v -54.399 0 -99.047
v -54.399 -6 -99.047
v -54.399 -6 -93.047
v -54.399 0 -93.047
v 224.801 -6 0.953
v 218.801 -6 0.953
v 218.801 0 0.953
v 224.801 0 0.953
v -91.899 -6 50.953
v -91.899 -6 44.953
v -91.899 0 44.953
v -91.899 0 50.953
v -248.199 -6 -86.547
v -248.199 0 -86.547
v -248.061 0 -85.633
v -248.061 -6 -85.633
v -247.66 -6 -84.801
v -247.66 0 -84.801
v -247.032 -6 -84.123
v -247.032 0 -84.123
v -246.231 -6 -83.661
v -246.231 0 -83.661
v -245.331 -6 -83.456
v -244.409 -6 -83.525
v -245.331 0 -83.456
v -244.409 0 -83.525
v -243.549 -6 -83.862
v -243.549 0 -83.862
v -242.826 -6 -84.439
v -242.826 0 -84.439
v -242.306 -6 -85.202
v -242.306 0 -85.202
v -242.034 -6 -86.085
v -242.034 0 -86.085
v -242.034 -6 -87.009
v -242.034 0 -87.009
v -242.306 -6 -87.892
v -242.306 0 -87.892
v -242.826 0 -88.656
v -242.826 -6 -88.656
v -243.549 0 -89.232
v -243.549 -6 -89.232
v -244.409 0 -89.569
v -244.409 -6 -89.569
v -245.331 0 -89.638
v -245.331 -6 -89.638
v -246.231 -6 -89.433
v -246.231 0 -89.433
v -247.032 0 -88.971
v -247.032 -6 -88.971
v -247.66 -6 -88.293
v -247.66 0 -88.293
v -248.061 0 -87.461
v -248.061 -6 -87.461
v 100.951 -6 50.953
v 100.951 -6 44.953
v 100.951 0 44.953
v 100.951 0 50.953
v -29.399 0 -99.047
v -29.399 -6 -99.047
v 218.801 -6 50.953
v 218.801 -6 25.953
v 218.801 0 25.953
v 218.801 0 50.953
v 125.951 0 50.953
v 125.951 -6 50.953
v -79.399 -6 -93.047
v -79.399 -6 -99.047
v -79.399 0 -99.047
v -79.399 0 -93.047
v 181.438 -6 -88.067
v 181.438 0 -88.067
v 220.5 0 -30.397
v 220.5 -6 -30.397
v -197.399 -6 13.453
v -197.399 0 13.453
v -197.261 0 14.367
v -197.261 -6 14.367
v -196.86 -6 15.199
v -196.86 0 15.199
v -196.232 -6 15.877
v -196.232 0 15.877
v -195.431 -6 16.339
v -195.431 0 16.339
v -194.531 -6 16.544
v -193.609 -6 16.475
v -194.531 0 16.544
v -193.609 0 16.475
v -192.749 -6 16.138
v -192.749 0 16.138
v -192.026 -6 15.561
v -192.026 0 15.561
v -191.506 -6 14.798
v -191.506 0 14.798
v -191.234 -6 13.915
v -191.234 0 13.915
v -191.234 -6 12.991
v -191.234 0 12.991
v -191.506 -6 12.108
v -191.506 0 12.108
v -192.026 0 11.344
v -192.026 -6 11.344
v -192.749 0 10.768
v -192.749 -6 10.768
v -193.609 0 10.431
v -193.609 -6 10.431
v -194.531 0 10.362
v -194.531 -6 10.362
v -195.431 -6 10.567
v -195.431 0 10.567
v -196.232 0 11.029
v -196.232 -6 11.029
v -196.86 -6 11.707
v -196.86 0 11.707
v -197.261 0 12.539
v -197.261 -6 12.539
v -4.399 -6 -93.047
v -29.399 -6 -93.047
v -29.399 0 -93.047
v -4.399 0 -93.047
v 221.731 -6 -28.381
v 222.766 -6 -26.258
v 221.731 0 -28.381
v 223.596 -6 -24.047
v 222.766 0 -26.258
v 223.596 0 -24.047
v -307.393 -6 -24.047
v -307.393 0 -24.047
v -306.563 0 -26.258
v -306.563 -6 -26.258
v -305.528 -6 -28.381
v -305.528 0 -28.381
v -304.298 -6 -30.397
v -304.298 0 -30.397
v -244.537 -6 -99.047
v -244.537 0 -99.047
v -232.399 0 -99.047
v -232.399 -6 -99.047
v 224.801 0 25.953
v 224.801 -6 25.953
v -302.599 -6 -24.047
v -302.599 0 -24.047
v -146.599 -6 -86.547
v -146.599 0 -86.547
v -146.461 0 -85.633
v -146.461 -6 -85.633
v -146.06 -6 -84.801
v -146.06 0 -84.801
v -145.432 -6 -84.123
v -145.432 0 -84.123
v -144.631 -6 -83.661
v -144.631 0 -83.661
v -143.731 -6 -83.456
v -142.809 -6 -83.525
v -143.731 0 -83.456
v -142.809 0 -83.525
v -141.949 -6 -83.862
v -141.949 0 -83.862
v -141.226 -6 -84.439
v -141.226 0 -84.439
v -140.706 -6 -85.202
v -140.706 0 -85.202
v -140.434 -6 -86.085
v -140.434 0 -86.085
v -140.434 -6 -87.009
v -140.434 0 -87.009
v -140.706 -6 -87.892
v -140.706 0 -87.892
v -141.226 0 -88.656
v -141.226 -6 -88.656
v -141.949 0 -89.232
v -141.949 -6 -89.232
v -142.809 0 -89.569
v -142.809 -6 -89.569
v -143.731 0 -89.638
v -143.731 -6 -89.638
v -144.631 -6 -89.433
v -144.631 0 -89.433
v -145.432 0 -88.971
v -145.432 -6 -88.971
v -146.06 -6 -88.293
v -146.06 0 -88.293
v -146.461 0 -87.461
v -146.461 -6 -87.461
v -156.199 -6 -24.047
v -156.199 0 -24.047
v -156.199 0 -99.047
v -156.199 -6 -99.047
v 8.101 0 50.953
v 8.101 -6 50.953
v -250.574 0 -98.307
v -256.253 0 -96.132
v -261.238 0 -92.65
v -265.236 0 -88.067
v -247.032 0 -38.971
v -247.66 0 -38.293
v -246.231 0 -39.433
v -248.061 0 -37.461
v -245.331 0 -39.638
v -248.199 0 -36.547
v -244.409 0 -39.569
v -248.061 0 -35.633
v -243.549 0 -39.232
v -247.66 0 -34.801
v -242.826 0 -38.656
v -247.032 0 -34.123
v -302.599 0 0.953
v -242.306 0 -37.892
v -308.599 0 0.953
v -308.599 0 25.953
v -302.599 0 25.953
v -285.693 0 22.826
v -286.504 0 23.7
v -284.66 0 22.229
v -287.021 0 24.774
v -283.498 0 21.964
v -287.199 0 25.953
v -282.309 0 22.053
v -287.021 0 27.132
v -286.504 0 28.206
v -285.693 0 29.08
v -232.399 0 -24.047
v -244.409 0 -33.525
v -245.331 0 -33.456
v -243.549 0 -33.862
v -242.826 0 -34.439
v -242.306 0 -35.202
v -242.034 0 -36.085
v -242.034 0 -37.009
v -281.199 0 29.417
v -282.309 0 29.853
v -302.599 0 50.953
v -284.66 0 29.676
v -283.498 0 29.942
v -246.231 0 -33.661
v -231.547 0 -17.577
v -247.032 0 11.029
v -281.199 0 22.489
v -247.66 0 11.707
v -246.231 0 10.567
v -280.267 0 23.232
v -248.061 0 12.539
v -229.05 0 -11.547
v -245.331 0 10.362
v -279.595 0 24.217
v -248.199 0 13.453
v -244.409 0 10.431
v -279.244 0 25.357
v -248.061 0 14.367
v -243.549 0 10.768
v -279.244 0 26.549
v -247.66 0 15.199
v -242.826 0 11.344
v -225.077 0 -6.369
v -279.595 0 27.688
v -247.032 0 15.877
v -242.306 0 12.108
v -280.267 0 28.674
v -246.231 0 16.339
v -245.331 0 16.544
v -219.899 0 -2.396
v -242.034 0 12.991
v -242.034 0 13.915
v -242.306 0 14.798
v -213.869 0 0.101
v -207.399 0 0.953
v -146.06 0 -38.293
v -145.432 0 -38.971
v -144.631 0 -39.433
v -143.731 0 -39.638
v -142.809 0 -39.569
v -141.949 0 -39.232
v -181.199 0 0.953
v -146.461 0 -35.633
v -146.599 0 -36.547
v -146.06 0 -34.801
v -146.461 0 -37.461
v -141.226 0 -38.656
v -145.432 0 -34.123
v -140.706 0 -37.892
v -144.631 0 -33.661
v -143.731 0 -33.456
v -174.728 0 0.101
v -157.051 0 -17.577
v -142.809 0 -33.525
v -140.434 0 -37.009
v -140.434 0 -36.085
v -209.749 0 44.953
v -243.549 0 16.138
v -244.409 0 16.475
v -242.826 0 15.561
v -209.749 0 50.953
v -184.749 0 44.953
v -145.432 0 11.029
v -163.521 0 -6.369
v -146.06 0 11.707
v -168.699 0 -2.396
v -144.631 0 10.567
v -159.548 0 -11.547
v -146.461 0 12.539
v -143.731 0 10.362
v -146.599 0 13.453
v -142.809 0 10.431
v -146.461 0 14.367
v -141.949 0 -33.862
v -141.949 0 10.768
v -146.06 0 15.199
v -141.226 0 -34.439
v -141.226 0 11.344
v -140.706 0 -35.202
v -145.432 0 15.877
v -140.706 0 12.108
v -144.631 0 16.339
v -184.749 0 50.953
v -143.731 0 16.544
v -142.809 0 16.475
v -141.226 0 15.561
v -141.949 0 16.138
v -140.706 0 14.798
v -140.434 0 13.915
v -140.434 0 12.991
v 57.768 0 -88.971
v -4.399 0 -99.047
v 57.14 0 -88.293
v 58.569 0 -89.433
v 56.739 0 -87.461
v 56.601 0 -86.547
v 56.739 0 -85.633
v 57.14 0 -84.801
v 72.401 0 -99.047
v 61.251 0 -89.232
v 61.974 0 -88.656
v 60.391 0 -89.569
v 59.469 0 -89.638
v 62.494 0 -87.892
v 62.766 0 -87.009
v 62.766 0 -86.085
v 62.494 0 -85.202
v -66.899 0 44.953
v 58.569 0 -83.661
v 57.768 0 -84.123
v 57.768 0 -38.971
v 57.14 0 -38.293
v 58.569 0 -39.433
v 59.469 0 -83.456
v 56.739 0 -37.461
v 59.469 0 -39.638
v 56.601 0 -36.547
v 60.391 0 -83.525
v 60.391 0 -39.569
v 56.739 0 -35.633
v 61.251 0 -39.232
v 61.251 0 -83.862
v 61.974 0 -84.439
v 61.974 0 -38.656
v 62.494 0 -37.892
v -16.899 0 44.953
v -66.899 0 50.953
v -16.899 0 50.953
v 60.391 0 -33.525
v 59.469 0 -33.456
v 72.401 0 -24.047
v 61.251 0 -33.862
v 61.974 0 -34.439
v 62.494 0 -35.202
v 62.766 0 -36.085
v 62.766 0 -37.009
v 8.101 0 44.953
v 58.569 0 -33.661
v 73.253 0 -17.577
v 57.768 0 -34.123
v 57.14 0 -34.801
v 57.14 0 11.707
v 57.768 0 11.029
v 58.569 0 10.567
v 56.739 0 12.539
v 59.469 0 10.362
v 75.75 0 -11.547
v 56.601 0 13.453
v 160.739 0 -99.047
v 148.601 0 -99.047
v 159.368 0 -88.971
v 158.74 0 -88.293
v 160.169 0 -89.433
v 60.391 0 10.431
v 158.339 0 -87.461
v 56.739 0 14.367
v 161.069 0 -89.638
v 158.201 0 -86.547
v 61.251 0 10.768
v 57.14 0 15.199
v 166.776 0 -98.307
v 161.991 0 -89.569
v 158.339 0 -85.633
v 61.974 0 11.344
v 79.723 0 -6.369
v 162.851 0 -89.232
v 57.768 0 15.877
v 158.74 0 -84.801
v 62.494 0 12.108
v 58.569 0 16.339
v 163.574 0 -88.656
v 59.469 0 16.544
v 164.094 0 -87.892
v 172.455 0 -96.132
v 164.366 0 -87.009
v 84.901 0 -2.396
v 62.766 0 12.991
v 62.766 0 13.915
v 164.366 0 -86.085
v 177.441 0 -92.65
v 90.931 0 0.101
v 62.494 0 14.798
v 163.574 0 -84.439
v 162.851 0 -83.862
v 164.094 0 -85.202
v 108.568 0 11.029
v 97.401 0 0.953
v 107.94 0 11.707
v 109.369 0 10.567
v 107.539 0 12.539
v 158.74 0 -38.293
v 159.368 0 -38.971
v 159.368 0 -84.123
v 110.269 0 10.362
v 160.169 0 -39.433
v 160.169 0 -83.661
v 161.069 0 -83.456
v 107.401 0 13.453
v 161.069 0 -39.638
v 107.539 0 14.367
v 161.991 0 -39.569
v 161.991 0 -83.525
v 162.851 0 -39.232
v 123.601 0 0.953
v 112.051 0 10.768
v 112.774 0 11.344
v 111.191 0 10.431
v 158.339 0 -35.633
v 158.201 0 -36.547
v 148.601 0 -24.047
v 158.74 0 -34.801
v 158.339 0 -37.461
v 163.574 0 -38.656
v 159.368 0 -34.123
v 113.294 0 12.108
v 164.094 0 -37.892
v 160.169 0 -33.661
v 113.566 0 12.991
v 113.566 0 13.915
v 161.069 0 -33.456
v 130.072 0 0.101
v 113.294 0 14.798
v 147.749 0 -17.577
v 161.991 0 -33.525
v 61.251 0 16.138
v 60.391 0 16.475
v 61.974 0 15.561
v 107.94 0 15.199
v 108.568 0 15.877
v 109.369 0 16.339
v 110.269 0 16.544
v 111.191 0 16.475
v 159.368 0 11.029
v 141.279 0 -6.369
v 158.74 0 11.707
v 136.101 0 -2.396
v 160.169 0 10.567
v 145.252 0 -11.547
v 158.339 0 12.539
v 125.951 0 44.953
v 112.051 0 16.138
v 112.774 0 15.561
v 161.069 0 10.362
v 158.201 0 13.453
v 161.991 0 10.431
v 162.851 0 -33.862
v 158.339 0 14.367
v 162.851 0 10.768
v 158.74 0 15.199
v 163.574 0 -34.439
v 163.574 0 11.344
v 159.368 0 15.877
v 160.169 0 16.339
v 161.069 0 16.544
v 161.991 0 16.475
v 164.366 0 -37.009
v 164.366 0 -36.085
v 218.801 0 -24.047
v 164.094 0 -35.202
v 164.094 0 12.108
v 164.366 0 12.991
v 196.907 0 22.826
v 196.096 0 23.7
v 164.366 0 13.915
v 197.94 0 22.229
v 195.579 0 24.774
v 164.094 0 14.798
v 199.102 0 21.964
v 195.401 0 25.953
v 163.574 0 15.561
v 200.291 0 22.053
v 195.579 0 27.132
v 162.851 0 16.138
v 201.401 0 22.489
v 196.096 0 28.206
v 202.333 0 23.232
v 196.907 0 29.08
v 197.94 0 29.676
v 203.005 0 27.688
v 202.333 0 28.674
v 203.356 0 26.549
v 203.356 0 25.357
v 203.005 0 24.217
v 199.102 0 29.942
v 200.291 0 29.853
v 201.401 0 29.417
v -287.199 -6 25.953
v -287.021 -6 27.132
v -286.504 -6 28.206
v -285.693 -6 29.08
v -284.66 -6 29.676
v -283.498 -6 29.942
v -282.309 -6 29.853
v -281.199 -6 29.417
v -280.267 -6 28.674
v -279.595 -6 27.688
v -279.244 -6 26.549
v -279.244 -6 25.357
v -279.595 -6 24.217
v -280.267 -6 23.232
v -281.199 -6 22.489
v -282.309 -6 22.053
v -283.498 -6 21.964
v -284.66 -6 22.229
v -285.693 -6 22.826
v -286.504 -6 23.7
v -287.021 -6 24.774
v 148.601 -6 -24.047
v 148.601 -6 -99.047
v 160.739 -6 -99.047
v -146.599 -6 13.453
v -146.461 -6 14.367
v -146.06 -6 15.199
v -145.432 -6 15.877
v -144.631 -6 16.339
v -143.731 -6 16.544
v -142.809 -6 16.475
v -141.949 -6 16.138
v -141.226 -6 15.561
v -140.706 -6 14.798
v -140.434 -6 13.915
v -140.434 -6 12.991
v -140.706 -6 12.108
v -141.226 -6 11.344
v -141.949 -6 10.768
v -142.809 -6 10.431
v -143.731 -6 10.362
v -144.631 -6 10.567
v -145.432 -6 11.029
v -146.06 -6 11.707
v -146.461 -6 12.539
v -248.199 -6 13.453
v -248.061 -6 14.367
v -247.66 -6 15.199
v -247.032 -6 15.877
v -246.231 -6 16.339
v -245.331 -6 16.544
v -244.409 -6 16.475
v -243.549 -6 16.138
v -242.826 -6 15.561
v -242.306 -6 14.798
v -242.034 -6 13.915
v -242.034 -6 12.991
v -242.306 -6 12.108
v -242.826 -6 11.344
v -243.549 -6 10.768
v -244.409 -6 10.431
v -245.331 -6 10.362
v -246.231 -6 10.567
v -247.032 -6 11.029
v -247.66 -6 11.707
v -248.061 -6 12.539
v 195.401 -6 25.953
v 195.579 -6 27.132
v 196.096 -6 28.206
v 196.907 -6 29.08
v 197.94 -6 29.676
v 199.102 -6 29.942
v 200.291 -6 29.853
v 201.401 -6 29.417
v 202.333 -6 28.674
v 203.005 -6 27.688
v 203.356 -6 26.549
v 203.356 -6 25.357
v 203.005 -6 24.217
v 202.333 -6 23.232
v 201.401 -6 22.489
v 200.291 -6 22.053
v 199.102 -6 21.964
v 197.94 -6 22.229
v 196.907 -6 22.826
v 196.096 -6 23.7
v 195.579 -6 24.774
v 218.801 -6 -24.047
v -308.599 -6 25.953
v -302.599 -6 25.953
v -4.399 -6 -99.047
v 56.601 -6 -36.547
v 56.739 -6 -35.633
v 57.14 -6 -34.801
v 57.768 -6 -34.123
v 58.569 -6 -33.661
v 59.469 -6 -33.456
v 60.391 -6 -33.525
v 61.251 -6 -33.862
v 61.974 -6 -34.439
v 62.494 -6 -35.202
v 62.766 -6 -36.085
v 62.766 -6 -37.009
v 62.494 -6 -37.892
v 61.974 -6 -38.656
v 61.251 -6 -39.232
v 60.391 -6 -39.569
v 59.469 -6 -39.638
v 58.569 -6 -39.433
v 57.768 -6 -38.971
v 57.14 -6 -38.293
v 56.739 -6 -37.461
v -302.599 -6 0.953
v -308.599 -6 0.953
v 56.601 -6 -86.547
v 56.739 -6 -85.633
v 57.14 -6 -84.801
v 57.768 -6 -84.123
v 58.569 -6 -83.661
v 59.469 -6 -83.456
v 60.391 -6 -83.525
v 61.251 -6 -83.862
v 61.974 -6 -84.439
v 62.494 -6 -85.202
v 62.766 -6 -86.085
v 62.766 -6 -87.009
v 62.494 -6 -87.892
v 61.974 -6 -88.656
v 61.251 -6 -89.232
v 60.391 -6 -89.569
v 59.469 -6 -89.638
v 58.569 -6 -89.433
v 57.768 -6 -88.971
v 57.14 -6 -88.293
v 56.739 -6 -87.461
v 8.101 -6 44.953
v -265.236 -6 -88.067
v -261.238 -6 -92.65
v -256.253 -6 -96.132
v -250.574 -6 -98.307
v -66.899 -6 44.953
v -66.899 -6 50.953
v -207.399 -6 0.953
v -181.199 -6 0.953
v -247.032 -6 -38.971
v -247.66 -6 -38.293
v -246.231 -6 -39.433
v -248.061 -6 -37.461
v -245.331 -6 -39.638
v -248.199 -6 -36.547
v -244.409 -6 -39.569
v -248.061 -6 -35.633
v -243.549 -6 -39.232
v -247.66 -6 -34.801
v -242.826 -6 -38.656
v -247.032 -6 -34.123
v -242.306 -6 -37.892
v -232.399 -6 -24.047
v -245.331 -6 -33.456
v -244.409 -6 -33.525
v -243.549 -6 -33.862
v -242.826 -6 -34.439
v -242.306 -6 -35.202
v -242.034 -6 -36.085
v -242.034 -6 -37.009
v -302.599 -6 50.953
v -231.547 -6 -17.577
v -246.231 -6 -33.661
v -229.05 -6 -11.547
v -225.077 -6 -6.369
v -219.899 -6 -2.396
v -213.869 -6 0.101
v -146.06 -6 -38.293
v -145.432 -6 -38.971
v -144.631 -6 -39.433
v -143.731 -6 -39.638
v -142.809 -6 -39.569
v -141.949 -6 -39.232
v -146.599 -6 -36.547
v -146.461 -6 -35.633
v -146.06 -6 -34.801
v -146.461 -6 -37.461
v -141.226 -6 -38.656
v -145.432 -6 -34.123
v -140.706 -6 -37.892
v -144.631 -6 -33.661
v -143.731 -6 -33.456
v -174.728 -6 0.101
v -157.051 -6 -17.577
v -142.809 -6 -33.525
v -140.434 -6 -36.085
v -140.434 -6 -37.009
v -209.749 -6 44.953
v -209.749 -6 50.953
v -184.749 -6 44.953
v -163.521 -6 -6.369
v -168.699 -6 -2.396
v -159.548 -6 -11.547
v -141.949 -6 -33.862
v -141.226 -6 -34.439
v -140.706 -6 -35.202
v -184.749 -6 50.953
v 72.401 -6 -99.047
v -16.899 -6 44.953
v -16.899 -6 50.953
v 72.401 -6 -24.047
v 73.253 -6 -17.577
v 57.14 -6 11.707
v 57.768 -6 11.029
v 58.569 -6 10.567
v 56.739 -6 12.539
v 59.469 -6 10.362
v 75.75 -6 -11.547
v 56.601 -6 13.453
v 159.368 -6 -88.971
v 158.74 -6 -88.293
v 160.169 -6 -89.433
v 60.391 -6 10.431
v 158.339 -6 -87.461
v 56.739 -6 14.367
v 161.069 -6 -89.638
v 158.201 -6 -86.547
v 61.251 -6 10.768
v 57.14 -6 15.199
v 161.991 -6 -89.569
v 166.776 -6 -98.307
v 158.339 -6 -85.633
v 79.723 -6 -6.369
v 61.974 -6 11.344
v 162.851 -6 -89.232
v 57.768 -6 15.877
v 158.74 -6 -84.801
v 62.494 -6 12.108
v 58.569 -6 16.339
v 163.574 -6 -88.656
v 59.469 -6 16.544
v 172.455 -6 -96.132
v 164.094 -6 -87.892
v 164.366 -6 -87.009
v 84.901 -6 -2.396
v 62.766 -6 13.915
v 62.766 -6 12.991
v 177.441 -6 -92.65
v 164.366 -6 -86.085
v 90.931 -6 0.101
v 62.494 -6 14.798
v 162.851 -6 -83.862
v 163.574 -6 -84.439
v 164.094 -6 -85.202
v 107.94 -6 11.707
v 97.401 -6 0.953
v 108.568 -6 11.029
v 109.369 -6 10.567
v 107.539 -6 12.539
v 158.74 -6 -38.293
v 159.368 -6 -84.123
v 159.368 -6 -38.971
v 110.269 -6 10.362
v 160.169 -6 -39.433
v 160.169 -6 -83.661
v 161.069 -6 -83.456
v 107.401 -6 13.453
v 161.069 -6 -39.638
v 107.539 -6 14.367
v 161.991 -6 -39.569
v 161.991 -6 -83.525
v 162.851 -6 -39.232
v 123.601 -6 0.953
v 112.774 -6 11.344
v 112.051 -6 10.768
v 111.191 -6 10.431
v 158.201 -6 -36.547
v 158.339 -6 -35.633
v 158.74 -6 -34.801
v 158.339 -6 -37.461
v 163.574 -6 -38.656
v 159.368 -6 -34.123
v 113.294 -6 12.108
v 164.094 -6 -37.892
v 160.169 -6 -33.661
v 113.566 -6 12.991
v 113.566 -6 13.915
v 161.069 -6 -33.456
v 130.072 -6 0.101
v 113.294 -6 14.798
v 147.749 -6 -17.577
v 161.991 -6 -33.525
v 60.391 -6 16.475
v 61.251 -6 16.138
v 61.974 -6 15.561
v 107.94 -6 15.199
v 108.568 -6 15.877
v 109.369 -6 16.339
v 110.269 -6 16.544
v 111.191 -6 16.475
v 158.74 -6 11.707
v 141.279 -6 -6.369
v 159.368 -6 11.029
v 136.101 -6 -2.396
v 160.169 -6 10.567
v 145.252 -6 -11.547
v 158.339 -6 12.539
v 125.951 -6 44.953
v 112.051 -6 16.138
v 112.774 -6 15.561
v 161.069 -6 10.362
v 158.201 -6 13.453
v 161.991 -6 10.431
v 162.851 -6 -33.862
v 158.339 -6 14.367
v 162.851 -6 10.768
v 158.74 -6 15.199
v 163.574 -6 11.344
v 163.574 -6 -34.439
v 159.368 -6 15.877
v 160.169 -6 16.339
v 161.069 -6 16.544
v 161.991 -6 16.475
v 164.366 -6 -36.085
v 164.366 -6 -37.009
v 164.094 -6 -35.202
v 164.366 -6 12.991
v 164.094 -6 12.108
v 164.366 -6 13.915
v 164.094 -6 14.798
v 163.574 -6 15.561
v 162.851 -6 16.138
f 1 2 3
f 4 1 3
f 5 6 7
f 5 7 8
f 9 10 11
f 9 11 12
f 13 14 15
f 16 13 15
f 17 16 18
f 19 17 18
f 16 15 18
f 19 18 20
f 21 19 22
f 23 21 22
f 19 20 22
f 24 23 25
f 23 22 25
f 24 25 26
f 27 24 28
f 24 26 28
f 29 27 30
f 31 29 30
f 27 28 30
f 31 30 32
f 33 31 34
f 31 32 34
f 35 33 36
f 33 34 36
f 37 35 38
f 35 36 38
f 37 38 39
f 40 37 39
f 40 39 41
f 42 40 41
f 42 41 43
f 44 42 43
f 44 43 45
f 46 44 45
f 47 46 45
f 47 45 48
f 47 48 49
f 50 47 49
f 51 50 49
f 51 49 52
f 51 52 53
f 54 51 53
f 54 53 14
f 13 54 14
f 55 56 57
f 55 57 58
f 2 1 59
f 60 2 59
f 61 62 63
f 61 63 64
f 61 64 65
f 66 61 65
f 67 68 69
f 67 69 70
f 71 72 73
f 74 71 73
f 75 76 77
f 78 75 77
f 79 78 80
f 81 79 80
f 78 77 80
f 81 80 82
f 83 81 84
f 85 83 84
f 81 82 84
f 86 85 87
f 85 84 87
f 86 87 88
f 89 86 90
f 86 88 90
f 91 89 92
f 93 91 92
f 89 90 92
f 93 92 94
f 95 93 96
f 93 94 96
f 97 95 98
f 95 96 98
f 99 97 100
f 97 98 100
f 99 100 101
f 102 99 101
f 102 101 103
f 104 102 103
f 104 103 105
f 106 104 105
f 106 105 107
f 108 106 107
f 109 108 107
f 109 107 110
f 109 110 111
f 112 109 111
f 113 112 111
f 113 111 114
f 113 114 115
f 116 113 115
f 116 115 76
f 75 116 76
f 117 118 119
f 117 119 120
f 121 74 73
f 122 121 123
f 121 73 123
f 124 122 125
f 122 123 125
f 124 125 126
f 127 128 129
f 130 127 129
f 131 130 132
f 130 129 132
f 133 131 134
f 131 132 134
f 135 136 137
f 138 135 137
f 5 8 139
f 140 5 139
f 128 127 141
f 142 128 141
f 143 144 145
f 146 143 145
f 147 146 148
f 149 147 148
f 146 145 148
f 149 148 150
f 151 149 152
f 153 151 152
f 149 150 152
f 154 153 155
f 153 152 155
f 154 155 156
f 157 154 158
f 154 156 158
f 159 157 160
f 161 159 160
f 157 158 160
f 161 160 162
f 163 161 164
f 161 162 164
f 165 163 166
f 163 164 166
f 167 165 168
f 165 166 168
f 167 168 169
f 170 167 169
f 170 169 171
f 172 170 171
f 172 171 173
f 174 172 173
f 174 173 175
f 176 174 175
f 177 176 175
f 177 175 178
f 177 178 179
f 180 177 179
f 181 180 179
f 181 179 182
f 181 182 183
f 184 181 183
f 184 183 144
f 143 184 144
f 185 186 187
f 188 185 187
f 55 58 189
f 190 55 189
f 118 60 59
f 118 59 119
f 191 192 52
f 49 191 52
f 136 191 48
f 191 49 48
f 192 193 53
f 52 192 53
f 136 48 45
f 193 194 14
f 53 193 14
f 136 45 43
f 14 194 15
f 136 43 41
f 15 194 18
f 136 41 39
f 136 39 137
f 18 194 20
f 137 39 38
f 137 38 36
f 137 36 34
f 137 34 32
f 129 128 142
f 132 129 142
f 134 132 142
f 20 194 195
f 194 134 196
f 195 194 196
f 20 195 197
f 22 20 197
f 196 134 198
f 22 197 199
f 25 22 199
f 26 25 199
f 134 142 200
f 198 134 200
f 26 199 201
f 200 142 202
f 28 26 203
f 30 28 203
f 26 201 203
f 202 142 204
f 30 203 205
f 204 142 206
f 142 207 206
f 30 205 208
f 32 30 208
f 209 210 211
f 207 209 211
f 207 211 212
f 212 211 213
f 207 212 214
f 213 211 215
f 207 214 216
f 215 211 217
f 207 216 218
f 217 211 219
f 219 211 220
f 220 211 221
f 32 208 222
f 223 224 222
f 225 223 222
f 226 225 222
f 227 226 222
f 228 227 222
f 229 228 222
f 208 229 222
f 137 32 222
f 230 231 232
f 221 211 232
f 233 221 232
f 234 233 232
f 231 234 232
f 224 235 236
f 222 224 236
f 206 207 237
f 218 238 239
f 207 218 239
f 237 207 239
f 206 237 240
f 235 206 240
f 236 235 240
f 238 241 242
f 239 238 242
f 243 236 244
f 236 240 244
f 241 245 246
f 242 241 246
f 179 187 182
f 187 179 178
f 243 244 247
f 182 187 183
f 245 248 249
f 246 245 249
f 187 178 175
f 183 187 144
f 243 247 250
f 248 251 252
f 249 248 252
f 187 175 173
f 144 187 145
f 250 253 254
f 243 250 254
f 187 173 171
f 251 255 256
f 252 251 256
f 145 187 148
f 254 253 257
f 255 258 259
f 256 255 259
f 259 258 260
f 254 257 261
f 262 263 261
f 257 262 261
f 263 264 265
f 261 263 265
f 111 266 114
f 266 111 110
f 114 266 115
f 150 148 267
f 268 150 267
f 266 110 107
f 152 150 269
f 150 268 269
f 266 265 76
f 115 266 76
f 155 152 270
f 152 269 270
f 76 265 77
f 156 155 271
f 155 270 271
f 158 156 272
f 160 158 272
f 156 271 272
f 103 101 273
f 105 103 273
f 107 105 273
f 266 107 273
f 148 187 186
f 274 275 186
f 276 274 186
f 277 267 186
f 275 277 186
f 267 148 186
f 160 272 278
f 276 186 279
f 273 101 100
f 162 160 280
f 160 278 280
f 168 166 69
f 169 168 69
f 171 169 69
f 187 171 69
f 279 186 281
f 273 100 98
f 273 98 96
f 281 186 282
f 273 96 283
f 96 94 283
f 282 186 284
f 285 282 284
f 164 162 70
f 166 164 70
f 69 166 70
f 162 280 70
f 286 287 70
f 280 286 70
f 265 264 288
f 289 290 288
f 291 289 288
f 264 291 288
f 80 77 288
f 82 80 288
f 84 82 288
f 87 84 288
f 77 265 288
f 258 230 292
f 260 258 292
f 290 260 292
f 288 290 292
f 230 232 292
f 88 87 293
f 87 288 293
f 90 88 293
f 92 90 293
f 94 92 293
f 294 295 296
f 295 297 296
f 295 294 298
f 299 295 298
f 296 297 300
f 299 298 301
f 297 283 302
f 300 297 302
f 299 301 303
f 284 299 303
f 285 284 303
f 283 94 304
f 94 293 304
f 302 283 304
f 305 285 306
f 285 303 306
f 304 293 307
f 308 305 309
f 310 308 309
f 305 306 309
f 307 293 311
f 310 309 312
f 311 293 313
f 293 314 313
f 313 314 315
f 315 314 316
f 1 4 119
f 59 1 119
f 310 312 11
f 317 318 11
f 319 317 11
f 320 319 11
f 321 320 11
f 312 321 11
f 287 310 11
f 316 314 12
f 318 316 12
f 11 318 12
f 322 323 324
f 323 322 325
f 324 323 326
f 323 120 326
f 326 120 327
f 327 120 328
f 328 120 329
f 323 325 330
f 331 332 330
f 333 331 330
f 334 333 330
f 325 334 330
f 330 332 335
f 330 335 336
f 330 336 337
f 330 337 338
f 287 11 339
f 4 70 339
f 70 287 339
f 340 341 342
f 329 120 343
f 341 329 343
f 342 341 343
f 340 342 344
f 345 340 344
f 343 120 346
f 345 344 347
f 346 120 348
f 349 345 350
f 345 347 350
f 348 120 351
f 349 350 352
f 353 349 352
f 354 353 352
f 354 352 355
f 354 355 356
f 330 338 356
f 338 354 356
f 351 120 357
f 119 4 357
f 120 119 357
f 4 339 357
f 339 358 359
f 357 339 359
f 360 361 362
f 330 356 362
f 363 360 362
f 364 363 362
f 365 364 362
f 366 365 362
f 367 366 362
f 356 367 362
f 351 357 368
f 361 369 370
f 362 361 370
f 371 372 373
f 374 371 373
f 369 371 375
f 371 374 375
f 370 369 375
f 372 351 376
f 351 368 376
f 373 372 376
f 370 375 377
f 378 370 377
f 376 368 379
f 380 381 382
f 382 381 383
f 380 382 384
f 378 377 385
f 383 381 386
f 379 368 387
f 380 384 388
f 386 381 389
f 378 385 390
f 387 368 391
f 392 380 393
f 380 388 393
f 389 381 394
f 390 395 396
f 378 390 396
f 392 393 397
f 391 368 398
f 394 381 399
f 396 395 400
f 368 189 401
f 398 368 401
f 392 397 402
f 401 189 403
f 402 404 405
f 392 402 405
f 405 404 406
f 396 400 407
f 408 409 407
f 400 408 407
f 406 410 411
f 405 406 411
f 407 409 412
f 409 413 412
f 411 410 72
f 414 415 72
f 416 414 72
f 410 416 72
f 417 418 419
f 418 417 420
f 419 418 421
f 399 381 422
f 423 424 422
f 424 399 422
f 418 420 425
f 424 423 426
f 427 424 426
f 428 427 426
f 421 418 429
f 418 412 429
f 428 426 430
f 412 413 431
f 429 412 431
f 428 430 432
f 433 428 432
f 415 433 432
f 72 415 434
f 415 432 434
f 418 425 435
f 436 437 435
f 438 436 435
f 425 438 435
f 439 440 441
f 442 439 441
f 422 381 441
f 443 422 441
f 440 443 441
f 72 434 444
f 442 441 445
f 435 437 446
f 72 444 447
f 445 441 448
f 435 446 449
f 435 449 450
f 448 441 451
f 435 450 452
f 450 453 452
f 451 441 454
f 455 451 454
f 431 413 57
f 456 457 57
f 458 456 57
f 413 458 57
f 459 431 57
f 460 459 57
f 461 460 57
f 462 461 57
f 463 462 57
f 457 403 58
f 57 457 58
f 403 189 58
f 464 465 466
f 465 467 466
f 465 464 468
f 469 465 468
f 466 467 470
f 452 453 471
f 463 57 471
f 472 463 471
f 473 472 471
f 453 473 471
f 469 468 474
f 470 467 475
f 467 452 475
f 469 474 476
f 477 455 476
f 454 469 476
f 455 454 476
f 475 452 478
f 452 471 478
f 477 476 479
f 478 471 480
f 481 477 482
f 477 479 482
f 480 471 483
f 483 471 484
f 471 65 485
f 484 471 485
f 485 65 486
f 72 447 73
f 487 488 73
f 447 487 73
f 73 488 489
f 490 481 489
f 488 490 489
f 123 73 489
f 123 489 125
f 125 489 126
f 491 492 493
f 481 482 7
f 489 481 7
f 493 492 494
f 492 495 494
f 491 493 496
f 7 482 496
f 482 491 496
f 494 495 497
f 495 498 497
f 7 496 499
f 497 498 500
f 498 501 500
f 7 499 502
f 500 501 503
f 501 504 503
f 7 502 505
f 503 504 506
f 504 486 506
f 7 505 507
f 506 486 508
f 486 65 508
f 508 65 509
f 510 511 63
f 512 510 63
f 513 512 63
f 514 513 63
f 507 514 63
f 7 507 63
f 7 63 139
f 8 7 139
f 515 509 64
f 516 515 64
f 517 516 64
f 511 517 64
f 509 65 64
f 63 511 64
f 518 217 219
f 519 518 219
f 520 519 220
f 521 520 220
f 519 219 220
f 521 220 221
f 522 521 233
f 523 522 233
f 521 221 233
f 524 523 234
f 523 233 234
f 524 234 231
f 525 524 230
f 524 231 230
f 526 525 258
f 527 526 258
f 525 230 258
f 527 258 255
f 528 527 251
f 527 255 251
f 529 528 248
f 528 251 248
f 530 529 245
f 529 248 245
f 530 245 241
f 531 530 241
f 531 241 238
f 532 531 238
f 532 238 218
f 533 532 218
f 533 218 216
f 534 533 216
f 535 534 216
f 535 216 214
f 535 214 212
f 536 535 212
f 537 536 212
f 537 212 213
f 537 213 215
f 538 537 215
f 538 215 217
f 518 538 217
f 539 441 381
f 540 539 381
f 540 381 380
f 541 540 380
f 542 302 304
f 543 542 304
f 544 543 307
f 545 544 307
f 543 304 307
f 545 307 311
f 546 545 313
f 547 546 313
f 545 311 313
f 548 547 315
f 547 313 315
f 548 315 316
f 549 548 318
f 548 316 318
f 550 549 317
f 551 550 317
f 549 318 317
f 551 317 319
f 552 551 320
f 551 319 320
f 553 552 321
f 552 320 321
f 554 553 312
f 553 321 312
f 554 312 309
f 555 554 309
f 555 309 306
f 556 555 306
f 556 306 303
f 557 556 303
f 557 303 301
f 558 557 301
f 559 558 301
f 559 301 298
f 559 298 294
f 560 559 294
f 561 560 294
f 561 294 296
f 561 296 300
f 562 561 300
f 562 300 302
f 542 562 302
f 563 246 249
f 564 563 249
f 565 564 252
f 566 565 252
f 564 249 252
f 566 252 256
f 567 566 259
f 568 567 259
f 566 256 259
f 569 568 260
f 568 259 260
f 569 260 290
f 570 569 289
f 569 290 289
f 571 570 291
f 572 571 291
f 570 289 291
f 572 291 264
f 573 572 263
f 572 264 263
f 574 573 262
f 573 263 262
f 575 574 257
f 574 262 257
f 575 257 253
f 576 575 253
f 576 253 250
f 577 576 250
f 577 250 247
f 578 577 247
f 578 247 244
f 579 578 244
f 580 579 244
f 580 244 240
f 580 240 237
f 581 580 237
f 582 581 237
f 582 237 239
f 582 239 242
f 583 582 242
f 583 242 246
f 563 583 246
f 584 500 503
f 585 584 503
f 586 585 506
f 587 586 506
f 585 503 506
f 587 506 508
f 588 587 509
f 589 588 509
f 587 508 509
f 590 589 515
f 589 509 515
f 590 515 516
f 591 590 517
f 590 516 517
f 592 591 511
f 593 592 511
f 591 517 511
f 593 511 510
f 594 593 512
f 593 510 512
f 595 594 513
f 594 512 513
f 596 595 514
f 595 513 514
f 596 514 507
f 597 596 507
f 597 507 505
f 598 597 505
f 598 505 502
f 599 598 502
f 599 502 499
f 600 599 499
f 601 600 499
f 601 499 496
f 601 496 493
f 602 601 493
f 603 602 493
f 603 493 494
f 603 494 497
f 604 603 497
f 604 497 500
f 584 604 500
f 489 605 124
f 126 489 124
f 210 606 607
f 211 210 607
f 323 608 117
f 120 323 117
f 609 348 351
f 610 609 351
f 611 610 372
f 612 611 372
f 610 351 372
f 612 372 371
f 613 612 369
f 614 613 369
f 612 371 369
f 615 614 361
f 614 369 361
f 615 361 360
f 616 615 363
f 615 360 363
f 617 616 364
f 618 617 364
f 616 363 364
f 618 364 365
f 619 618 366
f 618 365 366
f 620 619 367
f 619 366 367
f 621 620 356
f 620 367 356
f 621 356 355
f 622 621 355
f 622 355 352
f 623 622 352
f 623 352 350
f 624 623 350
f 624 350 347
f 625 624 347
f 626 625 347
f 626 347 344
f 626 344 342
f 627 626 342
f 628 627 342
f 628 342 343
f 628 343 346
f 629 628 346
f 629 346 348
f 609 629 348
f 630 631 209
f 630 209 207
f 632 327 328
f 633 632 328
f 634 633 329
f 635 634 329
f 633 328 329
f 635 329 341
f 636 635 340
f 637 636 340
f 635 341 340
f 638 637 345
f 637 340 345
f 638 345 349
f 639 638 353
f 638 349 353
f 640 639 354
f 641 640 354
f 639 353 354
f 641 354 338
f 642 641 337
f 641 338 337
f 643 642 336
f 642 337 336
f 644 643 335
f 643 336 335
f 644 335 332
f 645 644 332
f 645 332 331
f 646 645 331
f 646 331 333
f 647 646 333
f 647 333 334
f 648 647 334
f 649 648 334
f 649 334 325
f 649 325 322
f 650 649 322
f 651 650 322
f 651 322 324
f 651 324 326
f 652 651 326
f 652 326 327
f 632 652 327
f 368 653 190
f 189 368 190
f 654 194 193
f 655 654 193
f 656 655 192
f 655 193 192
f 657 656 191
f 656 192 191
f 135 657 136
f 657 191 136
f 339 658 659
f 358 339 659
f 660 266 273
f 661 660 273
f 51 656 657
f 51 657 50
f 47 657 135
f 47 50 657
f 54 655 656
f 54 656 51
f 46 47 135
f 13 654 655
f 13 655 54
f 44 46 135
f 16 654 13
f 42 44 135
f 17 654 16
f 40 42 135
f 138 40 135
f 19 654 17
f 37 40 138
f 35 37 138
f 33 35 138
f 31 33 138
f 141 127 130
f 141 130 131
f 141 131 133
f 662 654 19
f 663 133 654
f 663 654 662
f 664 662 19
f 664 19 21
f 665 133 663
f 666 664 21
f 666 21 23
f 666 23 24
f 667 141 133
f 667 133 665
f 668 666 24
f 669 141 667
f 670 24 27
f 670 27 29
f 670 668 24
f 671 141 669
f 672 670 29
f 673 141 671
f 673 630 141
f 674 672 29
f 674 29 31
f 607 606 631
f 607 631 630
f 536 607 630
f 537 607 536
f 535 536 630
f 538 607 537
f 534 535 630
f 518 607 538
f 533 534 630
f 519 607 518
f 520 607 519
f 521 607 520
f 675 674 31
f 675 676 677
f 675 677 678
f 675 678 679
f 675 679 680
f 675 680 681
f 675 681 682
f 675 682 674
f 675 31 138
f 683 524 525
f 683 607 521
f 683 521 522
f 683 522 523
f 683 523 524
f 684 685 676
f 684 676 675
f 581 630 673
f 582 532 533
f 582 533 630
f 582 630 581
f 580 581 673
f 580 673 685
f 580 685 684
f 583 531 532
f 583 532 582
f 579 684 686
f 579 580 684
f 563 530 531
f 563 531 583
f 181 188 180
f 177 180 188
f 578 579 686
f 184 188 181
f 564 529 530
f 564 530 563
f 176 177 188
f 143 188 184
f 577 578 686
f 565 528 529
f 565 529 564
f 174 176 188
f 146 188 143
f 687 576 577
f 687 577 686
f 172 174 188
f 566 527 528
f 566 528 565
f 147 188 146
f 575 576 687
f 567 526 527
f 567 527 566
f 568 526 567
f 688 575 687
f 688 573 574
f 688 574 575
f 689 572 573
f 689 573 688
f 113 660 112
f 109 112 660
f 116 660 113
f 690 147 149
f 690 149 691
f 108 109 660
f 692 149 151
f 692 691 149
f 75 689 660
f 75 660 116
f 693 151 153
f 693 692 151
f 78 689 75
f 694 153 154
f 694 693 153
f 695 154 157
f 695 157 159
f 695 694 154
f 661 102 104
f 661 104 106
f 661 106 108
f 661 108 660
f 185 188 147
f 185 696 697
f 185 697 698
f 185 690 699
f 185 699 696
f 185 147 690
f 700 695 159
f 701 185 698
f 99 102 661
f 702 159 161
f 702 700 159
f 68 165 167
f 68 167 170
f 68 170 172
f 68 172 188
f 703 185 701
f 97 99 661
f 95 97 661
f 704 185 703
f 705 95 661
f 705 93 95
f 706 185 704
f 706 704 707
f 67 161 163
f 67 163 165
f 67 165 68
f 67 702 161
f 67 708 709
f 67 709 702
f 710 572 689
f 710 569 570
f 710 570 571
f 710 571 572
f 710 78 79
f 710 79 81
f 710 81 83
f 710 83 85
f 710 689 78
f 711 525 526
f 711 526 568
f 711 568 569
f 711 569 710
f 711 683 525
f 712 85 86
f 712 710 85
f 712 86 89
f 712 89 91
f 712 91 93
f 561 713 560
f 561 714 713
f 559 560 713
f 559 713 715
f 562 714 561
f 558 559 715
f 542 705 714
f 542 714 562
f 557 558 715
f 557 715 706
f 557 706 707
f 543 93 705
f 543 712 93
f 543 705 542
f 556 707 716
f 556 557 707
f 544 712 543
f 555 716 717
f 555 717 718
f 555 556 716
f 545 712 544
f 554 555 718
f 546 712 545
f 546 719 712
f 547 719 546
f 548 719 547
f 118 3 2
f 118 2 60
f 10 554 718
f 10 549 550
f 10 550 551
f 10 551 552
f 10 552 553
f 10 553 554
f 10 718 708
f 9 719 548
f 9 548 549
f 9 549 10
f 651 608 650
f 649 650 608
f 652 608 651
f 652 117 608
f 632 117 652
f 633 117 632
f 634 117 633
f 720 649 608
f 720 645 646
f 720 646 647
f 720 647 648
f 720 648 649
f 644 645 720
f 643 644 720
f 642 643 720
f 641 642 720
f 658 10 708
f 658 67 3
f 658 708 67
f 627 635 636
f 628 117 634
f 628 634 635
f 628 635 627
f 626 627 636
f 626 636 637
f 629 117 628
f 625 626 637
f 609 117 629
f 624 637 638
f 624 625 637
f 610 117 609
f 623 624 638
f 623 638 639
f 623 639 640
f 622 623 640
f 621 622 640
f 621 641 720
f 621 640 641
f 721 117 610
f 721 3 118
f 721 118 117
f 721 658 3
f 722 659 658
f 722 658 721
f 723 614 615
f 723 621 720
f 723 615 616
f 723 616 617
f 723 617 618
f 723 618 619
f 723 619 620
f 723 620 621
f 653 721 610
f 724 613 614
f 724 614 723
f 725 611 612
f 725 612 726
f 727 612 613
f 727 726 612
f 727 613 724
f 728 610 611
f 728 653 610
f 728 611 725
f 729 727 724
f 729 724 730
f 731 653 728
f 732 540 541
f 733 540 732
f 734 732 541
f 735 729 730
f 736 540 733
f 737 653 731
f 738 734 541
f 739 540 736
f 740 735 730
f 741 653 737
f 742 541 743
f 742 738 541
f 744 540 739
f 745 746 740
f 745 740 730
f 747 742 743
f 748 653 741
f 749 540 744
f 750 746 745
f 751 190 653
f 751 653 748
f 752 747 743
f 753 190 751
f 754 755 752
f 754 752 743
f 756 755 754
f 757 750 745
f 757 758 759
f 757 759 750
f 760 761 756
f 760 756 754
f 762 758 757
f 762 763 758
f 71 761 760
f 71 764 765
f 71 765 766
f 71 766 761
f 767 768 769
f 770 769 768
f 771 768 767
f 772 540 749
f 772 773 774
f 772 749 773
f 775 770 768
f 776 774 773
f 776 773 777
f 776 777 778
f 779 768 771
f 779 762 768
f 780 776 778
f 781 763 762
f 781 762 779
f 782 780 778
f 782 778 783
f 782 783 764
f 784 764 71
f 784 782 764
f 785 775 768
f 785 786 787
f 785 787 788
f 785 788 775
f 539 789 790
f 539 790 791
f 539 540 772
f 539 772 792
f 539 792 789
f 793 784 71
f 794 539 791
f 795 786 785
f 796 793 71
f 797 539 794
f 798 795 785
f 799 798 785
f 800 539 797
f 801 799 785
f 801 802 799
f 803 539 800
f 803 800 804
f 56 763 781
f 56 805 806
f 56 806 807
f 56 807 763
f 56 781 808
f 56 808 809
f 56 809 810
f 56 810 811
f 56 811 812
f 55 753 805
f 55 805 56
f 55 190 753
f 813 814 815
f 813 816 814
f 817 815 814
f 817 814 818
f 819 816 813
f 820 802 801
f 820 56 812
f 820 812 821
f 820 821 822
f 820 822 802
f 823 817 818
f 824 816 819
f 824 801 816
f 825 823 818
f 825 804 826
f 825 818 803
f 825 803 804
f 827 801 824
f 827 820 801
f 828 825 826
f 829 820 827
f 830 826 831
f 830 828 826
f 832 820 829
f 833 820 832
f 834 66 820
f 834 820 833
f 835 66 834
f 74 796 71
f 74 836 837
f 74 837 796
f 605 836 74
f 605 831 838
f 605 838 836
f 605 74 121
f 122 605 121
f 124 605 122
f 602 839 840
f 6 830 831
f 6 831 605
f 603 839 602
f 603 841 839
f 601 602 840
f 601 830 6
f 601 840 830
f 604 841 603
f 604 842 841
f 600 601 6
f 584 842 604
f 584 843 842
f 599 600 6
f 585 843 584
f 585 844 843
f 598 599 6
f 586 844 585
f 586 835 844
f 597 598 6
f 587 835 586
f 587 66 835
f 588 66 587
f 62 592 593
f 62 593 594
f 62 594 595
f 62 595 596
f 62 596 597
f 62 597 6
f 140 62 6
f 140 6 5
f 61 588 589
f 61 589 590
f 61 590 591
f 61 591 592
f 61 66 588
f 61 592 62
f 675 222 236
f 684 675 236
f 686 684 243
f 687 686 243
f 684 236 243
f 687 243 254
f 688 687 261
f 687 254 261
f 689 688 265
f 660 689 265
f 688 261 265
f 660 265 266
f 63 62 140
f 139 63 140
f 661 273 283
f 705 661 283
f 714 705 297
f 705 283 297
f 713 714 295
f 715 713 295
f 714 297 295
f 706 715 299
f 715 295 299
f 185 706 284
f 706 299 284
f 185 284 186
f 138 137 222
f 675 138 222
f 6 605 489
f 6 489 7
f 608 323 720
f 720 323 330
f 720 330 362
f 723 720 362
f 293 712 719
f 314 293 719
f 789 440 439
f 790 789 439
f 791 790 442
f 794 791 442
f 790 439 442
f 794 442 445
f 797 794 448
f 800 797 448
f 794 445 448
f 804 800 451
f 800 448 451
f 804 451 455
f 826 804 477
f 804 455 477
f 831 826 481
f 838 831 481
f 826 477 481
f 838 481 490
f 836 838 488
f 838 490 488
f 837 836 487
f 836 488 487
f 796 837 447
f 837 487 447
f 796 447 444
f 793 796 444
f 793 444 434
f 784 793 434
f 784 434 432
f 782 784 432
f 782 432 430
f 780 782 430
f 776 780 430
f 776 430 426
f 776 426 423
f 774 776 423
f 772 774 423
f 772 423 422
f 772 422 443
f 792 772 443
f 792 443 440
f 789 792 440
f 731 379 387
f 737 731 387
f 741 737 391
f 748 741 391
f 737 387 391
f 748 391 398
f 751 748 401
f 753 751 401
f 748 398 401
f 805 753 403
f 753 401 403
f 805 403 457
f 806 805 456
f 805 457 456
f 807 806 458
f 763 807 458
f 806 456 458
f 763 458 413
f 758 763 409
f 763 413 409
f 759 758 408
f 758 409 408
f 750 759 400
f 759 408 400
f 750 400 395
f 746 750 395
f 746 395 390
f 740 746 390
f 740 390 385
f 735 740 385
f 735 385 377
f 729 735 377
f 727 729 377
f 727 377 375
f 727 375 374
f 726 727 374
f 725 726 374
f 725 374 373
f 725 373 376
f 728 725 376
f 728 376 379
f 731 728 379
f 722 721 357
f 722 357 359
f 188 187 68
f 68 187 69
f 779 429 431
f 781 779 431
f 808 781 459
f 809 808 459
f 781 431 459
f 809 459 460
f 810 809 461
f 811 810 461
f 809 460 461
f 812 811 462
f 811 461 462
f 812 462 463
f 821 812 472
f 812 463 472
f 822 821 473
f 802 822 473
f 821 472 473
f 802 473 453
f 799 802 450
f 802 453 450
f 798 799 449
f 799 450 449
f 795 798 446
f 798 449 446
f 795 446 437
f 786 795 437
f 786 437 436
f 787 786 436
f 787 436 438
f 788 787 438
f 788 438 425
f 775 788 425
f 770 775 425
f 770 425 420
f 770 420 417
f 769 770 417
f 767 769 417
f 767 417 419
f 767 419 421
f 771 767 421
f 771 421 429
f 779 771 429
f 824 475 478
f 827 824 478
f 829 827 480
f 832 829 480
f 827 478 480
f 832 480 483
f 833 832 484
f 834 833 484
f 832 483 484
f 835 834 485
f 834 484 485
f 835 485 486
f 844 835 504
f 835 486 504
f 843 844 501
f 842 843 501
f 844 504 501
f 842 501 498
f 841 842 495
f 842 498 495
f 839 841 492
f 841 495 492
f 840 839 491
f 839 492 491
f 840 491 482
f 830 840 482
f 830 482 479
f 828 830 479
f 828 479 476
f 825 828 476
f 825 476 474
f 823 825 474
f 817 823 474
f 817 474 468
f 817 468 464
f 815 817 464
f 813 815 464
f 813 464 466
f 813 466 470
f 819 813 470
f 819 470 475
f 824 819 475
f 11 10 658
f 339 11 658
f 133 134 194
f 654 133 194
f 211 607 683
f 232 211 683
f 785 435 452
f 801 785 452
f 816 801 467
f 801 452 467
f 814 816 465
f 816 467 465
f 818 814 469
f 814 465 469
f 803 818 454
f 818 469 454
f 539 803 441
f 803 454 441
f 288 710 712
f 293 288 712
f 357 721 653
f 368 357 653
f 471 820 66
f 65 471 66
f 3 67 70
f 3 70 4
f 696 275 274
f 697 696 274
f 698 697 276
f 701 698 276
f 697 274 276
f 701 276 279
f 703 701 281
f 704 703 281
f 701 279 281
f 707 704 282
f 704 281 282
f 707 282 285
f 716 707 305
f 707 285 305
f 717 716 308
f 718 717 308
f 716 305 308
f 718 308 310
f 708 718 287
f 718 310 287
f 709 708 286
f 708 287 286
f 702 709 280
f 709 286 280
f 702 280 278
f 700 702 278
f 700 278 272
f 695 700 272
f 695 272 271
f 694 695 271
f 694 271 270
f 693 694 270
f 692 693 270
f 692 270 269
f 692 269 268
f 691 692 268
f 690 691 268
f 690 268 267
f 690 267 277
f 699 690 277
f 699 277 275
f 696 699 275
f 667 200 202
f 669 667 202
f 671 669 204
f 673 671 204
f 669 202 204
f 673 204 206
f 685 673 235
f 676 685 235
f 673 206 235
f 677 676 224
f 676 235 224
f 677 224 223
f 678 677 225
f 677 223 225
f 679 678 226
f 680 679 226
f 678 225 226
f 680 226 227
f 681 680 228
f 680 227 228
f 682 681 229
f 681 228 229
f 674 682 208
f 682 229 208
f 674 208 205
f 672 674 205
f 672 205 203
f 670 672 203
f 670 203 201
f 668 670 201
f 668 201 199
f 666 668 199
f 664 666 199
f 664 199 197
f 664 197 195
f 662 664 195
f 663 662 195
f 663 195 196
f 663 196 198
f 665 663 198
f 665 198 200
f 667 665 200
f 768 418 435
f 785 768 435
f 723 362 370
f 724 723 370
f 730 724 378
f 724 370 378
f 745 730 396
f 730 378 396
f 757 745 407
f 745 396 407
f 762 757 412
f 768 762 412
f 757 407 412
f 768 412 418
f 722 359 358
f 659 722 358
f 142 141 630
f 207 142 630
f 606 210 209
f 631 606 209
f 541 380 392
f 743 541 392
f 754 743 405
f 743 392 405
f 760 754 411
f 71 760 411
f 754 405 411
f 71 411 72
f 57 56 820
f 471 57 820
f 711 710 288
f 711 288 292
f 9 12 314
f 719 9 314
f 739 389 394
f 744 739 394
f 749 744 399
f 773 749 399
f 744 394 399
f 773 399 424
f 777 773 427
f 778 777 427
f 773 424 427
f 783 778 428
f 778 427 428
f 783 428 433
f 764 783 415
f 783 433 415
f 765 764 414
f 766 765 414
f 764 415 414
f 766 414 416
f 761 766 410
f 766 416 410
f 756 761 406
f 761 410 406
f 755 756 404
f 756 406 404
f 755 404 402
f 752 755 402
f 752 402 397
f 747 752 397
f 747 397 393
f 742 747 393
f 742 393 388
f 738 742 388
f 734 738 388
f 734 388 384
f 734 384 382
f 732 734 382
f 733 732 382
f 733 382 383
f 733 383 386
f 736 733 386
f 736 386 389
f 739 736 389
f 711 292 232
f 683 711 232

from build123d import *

# Parameters (mm, degrees)
F1_DEPTH = 6
F2_W     = 6
F2_H     = 25
F2_W_2   = 25
F2_H_2   = 6
F3_DEPTH = 25
F5_D     = 6.2
F6_D     = 8


with BuildPart() as f1:
    # F0 (on Front) → F1 (new body)
    with BuildSketch(Plane.XZ):
        with BuildLine():
            Line((224.8010802506, 50.9528913677), (-308.5989197494, 50.9528913677))
            Line((-308.5989197494, 50.9528913677), (-308.5989197494, -16.3773312117))
            ThreePointArc((-308.5989197494, -16.3773312117), (-307.4994411864, -23.709798398), (-304.2977137462, -30.3973143456))
            Line((-304.2977137462, -30.3973143456), (-265.2360511733, -88.0670917662))
            ThreePointArc((-265.2360511733, -88.0670917662), (-256.2526406882, -96.1321666846), (-244.5372571765, -99.0471086323))
            Line((-244.5372571765, -99.0471086323), (-232.3989197494, -99.0471086323))
            Line((-232.3989197494, -99.0471086323), (-232.3989197494, -24.0471086323))
            ThreePointArc((-232.3989197494, -24.0471086323), (-225.076589279, -6.3694391026), (-207.3989197494, 0.9528913677))
            Line((-207.3989197494, 0.9528913677), (-181.1989197494, 0.9528913677))
            ThreePointArc((-181.1989197494, 0.9528913677), (-163.5212502197, -6.3694391026), (-156.1989197494, -24.0471086323))
            Line((-156.1989197494, -24.0471086323), (-156.1989197494, -99.0471086323))
            Line((-156.1989197494, -99.0471086323), (72.4010802506, -99.0471086323))
            Line((72.4010802506, -99.0471086323), (72.4010802506, -24.0471086323))
            ThreePointArc((72.4010802506, -24.0471086323), (79.723410721, -6.3694391026), (97.4010802506, 0.9528913677))
            Line((97.4010802506, 0.9528913677), (123.6010802506, 0.9528913677))
            ThreePointArc((123.6010802506, 0.9528913677), (141.2787497803, -6.3694391026), (148.6010802506, -24.0471086323))
            Line((148.6010802506, -24.0471086323), (148.6010802506, -99.0471086323))
            Line((148.6010802506, -99.0471086323), (160.7394176777, -99.0471086323))
            ThreePointArc((160.7394176777, -99.0471086323), (172.4548011894, -96.1321666846), (181.4382116746, -88.0670917662))
            Line((181.4382116746, -88.0670917662), (220.4998742475, -30.3973143456))
            ThreePointArc((220.4998742475, -30.3973143456), (223.7016016877, -23.709798398), (224.8010802506, -16.3773312117))
            Line((224.8010802506, -16.3773312117), (224.8010802506, 50.9528913677))
        make_face()
    extrude(amount=F1_DEPTH)

    # F2 (on face) → F3 (cut)
    with BuildSketch(Plane.XZ.offset(6)):
        with Locations((-305.5989197494, 38.4528913677)):
            Rectangle(F2_W, F2_H)
        with Locations((-305.5989197494, -11.5471086323)):
            Rectangle(F2_W, F2_H)
        with Locations((221.8010802506, 38.4528913677)):
            Rectangle(F2_W, F2_H)
        with Locations((221.8010802506, -11.5471086323)):
            Rectangle(F2_W, F2_H)
        with Locations((-66.8989197494, -96.0471086323)):
            Rectangle(F2_W_2, F2_H_2)
        with Locations((-16.8989197494, -96.0471086323)):
            Rectangle(F2_W_2, F2_H_2)
        with Locations((-79.3989197494, 47.9528913677)):
            Rectangle(F2_W_2, F2_H_2)
        with Locations((-4.3989197494, 47.9528913677)):
            Rectangle(F2_W_2, F2_H_2)
        with Locations((-197.2489197494, 47.9528913677)):
            Rectangle(F2_W_2, F2_H_2)
        with Locations((113.4510802506, 47.9528913677)):
            Rectangle(F2_W_2, F2_H_2)
    extrude(amount=-F3_DEPTH, mode=Mode.SUBTRACT)

    # F5 (through all)
    with Locations(Plane.XZ.offset(6)):
        with Locations((-245.0989197494, -86.5471086323), (-245.0989197494, -36.5471086323), (-245.0989197494, 13.4528913677), (-194.2989197494, 13.4528913677), (-143.4989197494, 13.4528913677), (-143.4989197494, -36.5471086323), (-143.4989197494, -86.5471086323), (59.7010802506, -86.5471086323), (59.7010802506, -36.5471086323), (59.7010802506, 13.4528913677), (110.5010802506, 13.4528913677), (161.3010802506, 13.4528913677), (161.3010802506, -36.5471086323), (161.3010802506, -86.5471086323)):
            Hole(F5_D / 2)

    # F6 (through all)
    with Locations(Plane.XZ.offset(6)):
        with Locations((-283.1989197494, 25.9528913677), (199.4010802506, 25.9528913677)):
            Hole(F6_D / 2)


solid = f1.part
